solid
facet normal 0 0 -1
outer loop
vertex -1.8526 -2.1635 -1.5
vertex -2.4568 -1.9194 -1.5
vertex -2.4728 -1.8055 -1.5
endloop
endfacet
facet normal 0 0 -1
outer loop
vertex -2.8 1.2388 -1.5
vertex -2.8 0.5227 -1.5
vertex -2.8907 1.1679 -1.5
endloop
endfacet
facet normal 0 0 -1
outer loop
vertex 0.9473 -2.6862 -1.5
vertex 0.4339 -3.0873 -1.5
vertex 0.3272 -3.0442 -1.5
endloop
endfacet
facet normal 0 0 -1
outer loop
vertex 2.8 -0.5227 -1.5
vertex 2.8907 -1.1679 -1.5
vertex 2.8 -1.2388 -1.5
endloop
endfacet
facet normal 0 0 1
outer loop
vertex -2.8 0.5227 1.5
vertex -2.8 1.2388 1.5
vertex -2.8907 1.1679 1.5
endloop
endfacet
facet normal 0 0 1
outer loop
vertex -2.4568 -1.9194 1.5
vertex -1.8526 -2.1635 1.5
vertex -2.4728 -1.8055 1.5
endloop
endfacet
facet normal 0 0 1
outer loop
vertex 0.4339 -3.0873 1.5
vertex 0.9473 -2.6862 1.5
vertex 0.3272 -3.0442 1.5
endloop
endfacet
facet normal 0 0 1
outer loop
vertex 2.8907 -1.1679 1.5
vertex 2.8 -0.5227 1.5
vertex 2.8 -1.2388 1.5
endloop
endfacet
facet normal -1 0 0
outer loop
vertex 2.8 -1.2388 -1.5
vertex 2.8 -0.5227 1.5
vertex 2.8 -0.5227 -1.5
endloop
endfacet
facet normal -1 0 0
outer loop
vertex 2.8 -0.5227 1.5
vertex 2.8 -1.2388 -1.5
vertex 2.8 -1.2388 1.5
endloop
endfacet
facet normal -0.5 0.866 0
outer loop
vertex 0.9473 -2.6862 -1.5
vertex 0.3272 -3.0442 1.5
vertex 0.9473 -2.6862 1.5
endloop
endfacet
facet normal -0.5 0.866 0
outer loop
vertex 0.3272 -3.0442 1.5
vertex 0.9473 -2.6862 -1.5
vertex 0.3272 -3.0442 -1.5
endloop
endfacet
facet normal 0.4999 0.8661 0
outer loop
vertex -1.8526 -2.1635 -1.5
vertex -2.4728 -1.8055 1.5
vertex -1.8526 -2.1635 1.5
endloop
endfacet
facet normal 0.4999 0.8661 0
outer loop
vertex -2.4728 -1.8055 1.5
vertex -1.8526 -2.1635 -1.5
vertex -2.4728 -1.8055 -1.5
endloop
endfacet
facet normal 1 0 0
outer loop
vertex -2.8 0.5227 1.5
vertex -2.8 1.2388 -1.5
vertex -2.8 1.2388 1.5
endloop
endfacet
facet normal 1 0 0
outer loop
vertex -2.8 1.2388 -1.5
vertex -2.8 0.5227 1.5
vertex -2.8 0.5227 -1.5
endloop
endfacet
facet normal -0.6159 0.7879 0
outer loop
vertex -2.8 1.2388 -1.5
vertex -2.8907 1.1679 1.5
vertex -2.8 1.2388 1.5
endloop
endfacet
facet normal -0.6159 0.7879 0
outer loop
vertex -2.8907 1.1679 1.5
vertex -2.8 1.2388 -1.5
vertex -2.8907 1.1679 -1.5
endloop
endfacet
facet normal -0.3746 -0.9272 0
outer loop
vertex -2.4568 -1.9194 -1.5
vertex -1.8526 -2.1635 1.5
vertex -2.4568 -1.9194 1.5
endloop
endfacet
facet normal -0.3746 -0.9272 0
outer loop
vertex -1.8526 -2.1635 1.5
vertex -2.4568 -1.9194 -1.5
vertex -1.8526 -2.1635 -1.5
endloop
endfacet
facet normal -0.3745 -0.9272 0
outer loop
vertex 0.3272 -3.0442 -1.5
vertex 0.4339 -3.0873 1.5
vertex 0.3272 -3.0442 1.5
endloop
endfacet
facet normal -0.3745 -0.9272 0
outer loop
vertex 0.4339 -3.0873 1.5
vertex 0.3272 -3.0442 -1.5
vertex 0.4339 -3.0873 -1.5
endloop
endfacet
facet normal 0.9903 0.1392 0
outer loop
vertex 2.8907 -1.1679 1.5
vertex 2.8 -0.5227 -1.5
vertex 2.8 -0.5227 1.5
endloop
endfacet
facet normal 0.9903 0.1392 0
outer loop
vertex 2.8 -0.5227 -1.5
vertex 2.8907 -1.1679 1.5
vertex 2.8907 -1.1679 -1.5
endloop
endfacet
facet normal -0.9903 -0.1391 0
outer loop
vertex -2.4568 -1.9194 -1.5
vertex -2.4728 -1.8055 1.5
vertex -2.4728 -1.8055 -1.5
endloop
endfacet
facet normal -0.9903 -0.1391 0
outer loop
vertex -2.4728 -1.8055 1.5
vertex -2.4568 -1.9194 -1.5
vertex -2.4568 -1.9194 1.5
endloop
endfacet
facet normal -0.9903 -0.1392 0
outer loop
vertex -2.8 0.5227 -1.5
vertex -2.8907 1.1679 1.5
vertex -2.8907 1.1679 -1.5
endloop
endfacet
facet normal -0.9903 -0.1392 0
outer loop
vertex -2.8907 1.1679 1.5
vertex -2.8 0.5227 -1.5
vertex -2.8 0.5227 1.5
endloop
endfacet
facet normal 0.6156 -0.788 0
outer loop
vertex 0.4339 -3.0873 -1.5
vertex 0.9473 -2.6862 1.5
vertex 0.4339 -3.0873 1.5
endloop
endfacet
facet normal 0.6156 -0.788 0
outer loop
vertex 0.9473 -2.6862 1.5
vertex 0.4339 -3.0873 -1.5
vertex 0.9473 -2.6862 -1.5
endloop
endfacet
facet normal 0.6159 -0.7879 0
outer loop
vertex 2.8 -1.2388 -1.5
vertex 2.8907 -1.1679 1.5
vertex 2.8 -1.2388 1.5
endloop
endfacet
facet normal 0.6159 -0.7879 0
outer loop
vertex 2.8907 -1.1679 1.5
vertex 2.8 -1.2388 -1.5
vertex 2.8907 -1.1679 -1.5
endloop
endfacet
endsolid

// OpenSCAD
// file: ../spanner.scad
// ============================================================
//  Nut spanner: flat, double-ended open spanner for the M3 nylocks on
//  the adjust screws (hold the nylock, turn the screw head).
//  End 0: mouth 15 deg off the handle (X nylock, from above).
//  End 1: mouth 90 deg to the handle (Z nylock, from the side).
//  Lies flat on z = 0..spanner_t, end 0's nut centre at the origin,
//  handle along +X.
// ============================================================
include <lib.scad>

spanner_af = lock_nut_af + 0.2; // same tight fit as the nut pockets
spanner_t = 3; // fits the 4 mm nylock with room to spare
spanner_jaw = 3; // jaw wall
spanner_tip = 2.4; // jaw tips past the nut centre
spanner_len = 75; // end centre to end centre
spanner_w = 8; // handle width
spanner_mouth = [165, 90]; // mouth direction per end, from the handle (+X)
spanner_label = "5.5mm"; // nominal spanner size (M3 nut)
spanner_label_depth = 0.6; // recessed into the top face

_sp_corner = spanner_af / cos(30) / 2; // hex throat: flats on the jaw faces
_sp_back = _sp_corner + spanner_jaw; // nut centre to the back of the head

function spanner_centre(e) = e == 0 ? [0, 0] : [spanner_len, 0];
// end 1's mouth points -Y, so its handle runs away toward -X when posed
function spanner_dir(e) = e == 0 ? spanner_mouth[0] : 360 - spanner_mouth[1];

// head outline / slot, mouth along +Y, nut centre at the origin
module spanner_head_2d() {
    hw = spanner_af / 2 + spanner_jaw;
    offset(r = 1.5) offset(delta = -1.5)
        translate([-hw, -_sp_back]) square([2 * hw, _sp_back + spanner_tip]);
}
module spanner_slot_2d() {
    translate([-spanner_af / 2, 0]) square([spanner_af, spanner_tip + 1]);
    rotate(90) circle(r = _sp_corner, $fn = 6); // flats on the jaws
}

// handle ends sit behind each head so they never reach past the jaw tips
_sp_handle = [[6, 0], [spanner_len - 6, 2]];

// size label along the handle's centre line
module spanner_label_2d() {
    a = _sp_handle[0]; b = _sp_handle[1];
    translate((a + b) / 2) rotate(atan2(b[1] - a[1], b[0] - a[0]))
        text(spanner_label, size = 4.5, font = "Liberation Sans:style=Bold", halign = "center", valign = "center");
}

module nut_spanner() {
    difference() {
        spanner_body();
        translate([0, 0, spanner_t - spanner_label_depth]) linear_extrude(spanner_label_depth + 1) spanner_label_2d();
    }
}

module spanner_body() {
    linear_extrude(spanner_t) difference() {
        union() {
            for (e = [0, 1]) translate(spanner_centre(e)) rotate(spanner_dir(e) - 90) spanner_head_2d();
            hull() for (p = _sp_handle) translate(p) circle(d = spanner_w, $fn = 32);
        }
        for (e = [0, 1]) translate(spanner_centre(e)) rotate(spanner_dir(e) - 90) spanner_slot_2d();
    }
}

// Spanner placed with end e's nut centre at the origin, its mouth along
// +Y and its thickness centred on z = 0 (for fit and reach checks).
module spanner_at(e) {
    rotate(90 - spanner_dir(e)) translate([-spanner_centre(e)[0], -spanner_centre(e)[1], -spanner_t / 2])
        nut_spanner();
}
// main file
// The spanner's 90 deg end must grip: a real nut (5.4 AF) turned 8 deg in
// the jaw must hit it. Must render NON-empty.
include <../spanner.scad>
af = 5.4;
intersection() {
  spanner_at(1);
  rotate([0, 0, 90 + 8]) cylinder(d = af / cos(30), h = spanner_t + 2, center = true, $fn = 6);
}
